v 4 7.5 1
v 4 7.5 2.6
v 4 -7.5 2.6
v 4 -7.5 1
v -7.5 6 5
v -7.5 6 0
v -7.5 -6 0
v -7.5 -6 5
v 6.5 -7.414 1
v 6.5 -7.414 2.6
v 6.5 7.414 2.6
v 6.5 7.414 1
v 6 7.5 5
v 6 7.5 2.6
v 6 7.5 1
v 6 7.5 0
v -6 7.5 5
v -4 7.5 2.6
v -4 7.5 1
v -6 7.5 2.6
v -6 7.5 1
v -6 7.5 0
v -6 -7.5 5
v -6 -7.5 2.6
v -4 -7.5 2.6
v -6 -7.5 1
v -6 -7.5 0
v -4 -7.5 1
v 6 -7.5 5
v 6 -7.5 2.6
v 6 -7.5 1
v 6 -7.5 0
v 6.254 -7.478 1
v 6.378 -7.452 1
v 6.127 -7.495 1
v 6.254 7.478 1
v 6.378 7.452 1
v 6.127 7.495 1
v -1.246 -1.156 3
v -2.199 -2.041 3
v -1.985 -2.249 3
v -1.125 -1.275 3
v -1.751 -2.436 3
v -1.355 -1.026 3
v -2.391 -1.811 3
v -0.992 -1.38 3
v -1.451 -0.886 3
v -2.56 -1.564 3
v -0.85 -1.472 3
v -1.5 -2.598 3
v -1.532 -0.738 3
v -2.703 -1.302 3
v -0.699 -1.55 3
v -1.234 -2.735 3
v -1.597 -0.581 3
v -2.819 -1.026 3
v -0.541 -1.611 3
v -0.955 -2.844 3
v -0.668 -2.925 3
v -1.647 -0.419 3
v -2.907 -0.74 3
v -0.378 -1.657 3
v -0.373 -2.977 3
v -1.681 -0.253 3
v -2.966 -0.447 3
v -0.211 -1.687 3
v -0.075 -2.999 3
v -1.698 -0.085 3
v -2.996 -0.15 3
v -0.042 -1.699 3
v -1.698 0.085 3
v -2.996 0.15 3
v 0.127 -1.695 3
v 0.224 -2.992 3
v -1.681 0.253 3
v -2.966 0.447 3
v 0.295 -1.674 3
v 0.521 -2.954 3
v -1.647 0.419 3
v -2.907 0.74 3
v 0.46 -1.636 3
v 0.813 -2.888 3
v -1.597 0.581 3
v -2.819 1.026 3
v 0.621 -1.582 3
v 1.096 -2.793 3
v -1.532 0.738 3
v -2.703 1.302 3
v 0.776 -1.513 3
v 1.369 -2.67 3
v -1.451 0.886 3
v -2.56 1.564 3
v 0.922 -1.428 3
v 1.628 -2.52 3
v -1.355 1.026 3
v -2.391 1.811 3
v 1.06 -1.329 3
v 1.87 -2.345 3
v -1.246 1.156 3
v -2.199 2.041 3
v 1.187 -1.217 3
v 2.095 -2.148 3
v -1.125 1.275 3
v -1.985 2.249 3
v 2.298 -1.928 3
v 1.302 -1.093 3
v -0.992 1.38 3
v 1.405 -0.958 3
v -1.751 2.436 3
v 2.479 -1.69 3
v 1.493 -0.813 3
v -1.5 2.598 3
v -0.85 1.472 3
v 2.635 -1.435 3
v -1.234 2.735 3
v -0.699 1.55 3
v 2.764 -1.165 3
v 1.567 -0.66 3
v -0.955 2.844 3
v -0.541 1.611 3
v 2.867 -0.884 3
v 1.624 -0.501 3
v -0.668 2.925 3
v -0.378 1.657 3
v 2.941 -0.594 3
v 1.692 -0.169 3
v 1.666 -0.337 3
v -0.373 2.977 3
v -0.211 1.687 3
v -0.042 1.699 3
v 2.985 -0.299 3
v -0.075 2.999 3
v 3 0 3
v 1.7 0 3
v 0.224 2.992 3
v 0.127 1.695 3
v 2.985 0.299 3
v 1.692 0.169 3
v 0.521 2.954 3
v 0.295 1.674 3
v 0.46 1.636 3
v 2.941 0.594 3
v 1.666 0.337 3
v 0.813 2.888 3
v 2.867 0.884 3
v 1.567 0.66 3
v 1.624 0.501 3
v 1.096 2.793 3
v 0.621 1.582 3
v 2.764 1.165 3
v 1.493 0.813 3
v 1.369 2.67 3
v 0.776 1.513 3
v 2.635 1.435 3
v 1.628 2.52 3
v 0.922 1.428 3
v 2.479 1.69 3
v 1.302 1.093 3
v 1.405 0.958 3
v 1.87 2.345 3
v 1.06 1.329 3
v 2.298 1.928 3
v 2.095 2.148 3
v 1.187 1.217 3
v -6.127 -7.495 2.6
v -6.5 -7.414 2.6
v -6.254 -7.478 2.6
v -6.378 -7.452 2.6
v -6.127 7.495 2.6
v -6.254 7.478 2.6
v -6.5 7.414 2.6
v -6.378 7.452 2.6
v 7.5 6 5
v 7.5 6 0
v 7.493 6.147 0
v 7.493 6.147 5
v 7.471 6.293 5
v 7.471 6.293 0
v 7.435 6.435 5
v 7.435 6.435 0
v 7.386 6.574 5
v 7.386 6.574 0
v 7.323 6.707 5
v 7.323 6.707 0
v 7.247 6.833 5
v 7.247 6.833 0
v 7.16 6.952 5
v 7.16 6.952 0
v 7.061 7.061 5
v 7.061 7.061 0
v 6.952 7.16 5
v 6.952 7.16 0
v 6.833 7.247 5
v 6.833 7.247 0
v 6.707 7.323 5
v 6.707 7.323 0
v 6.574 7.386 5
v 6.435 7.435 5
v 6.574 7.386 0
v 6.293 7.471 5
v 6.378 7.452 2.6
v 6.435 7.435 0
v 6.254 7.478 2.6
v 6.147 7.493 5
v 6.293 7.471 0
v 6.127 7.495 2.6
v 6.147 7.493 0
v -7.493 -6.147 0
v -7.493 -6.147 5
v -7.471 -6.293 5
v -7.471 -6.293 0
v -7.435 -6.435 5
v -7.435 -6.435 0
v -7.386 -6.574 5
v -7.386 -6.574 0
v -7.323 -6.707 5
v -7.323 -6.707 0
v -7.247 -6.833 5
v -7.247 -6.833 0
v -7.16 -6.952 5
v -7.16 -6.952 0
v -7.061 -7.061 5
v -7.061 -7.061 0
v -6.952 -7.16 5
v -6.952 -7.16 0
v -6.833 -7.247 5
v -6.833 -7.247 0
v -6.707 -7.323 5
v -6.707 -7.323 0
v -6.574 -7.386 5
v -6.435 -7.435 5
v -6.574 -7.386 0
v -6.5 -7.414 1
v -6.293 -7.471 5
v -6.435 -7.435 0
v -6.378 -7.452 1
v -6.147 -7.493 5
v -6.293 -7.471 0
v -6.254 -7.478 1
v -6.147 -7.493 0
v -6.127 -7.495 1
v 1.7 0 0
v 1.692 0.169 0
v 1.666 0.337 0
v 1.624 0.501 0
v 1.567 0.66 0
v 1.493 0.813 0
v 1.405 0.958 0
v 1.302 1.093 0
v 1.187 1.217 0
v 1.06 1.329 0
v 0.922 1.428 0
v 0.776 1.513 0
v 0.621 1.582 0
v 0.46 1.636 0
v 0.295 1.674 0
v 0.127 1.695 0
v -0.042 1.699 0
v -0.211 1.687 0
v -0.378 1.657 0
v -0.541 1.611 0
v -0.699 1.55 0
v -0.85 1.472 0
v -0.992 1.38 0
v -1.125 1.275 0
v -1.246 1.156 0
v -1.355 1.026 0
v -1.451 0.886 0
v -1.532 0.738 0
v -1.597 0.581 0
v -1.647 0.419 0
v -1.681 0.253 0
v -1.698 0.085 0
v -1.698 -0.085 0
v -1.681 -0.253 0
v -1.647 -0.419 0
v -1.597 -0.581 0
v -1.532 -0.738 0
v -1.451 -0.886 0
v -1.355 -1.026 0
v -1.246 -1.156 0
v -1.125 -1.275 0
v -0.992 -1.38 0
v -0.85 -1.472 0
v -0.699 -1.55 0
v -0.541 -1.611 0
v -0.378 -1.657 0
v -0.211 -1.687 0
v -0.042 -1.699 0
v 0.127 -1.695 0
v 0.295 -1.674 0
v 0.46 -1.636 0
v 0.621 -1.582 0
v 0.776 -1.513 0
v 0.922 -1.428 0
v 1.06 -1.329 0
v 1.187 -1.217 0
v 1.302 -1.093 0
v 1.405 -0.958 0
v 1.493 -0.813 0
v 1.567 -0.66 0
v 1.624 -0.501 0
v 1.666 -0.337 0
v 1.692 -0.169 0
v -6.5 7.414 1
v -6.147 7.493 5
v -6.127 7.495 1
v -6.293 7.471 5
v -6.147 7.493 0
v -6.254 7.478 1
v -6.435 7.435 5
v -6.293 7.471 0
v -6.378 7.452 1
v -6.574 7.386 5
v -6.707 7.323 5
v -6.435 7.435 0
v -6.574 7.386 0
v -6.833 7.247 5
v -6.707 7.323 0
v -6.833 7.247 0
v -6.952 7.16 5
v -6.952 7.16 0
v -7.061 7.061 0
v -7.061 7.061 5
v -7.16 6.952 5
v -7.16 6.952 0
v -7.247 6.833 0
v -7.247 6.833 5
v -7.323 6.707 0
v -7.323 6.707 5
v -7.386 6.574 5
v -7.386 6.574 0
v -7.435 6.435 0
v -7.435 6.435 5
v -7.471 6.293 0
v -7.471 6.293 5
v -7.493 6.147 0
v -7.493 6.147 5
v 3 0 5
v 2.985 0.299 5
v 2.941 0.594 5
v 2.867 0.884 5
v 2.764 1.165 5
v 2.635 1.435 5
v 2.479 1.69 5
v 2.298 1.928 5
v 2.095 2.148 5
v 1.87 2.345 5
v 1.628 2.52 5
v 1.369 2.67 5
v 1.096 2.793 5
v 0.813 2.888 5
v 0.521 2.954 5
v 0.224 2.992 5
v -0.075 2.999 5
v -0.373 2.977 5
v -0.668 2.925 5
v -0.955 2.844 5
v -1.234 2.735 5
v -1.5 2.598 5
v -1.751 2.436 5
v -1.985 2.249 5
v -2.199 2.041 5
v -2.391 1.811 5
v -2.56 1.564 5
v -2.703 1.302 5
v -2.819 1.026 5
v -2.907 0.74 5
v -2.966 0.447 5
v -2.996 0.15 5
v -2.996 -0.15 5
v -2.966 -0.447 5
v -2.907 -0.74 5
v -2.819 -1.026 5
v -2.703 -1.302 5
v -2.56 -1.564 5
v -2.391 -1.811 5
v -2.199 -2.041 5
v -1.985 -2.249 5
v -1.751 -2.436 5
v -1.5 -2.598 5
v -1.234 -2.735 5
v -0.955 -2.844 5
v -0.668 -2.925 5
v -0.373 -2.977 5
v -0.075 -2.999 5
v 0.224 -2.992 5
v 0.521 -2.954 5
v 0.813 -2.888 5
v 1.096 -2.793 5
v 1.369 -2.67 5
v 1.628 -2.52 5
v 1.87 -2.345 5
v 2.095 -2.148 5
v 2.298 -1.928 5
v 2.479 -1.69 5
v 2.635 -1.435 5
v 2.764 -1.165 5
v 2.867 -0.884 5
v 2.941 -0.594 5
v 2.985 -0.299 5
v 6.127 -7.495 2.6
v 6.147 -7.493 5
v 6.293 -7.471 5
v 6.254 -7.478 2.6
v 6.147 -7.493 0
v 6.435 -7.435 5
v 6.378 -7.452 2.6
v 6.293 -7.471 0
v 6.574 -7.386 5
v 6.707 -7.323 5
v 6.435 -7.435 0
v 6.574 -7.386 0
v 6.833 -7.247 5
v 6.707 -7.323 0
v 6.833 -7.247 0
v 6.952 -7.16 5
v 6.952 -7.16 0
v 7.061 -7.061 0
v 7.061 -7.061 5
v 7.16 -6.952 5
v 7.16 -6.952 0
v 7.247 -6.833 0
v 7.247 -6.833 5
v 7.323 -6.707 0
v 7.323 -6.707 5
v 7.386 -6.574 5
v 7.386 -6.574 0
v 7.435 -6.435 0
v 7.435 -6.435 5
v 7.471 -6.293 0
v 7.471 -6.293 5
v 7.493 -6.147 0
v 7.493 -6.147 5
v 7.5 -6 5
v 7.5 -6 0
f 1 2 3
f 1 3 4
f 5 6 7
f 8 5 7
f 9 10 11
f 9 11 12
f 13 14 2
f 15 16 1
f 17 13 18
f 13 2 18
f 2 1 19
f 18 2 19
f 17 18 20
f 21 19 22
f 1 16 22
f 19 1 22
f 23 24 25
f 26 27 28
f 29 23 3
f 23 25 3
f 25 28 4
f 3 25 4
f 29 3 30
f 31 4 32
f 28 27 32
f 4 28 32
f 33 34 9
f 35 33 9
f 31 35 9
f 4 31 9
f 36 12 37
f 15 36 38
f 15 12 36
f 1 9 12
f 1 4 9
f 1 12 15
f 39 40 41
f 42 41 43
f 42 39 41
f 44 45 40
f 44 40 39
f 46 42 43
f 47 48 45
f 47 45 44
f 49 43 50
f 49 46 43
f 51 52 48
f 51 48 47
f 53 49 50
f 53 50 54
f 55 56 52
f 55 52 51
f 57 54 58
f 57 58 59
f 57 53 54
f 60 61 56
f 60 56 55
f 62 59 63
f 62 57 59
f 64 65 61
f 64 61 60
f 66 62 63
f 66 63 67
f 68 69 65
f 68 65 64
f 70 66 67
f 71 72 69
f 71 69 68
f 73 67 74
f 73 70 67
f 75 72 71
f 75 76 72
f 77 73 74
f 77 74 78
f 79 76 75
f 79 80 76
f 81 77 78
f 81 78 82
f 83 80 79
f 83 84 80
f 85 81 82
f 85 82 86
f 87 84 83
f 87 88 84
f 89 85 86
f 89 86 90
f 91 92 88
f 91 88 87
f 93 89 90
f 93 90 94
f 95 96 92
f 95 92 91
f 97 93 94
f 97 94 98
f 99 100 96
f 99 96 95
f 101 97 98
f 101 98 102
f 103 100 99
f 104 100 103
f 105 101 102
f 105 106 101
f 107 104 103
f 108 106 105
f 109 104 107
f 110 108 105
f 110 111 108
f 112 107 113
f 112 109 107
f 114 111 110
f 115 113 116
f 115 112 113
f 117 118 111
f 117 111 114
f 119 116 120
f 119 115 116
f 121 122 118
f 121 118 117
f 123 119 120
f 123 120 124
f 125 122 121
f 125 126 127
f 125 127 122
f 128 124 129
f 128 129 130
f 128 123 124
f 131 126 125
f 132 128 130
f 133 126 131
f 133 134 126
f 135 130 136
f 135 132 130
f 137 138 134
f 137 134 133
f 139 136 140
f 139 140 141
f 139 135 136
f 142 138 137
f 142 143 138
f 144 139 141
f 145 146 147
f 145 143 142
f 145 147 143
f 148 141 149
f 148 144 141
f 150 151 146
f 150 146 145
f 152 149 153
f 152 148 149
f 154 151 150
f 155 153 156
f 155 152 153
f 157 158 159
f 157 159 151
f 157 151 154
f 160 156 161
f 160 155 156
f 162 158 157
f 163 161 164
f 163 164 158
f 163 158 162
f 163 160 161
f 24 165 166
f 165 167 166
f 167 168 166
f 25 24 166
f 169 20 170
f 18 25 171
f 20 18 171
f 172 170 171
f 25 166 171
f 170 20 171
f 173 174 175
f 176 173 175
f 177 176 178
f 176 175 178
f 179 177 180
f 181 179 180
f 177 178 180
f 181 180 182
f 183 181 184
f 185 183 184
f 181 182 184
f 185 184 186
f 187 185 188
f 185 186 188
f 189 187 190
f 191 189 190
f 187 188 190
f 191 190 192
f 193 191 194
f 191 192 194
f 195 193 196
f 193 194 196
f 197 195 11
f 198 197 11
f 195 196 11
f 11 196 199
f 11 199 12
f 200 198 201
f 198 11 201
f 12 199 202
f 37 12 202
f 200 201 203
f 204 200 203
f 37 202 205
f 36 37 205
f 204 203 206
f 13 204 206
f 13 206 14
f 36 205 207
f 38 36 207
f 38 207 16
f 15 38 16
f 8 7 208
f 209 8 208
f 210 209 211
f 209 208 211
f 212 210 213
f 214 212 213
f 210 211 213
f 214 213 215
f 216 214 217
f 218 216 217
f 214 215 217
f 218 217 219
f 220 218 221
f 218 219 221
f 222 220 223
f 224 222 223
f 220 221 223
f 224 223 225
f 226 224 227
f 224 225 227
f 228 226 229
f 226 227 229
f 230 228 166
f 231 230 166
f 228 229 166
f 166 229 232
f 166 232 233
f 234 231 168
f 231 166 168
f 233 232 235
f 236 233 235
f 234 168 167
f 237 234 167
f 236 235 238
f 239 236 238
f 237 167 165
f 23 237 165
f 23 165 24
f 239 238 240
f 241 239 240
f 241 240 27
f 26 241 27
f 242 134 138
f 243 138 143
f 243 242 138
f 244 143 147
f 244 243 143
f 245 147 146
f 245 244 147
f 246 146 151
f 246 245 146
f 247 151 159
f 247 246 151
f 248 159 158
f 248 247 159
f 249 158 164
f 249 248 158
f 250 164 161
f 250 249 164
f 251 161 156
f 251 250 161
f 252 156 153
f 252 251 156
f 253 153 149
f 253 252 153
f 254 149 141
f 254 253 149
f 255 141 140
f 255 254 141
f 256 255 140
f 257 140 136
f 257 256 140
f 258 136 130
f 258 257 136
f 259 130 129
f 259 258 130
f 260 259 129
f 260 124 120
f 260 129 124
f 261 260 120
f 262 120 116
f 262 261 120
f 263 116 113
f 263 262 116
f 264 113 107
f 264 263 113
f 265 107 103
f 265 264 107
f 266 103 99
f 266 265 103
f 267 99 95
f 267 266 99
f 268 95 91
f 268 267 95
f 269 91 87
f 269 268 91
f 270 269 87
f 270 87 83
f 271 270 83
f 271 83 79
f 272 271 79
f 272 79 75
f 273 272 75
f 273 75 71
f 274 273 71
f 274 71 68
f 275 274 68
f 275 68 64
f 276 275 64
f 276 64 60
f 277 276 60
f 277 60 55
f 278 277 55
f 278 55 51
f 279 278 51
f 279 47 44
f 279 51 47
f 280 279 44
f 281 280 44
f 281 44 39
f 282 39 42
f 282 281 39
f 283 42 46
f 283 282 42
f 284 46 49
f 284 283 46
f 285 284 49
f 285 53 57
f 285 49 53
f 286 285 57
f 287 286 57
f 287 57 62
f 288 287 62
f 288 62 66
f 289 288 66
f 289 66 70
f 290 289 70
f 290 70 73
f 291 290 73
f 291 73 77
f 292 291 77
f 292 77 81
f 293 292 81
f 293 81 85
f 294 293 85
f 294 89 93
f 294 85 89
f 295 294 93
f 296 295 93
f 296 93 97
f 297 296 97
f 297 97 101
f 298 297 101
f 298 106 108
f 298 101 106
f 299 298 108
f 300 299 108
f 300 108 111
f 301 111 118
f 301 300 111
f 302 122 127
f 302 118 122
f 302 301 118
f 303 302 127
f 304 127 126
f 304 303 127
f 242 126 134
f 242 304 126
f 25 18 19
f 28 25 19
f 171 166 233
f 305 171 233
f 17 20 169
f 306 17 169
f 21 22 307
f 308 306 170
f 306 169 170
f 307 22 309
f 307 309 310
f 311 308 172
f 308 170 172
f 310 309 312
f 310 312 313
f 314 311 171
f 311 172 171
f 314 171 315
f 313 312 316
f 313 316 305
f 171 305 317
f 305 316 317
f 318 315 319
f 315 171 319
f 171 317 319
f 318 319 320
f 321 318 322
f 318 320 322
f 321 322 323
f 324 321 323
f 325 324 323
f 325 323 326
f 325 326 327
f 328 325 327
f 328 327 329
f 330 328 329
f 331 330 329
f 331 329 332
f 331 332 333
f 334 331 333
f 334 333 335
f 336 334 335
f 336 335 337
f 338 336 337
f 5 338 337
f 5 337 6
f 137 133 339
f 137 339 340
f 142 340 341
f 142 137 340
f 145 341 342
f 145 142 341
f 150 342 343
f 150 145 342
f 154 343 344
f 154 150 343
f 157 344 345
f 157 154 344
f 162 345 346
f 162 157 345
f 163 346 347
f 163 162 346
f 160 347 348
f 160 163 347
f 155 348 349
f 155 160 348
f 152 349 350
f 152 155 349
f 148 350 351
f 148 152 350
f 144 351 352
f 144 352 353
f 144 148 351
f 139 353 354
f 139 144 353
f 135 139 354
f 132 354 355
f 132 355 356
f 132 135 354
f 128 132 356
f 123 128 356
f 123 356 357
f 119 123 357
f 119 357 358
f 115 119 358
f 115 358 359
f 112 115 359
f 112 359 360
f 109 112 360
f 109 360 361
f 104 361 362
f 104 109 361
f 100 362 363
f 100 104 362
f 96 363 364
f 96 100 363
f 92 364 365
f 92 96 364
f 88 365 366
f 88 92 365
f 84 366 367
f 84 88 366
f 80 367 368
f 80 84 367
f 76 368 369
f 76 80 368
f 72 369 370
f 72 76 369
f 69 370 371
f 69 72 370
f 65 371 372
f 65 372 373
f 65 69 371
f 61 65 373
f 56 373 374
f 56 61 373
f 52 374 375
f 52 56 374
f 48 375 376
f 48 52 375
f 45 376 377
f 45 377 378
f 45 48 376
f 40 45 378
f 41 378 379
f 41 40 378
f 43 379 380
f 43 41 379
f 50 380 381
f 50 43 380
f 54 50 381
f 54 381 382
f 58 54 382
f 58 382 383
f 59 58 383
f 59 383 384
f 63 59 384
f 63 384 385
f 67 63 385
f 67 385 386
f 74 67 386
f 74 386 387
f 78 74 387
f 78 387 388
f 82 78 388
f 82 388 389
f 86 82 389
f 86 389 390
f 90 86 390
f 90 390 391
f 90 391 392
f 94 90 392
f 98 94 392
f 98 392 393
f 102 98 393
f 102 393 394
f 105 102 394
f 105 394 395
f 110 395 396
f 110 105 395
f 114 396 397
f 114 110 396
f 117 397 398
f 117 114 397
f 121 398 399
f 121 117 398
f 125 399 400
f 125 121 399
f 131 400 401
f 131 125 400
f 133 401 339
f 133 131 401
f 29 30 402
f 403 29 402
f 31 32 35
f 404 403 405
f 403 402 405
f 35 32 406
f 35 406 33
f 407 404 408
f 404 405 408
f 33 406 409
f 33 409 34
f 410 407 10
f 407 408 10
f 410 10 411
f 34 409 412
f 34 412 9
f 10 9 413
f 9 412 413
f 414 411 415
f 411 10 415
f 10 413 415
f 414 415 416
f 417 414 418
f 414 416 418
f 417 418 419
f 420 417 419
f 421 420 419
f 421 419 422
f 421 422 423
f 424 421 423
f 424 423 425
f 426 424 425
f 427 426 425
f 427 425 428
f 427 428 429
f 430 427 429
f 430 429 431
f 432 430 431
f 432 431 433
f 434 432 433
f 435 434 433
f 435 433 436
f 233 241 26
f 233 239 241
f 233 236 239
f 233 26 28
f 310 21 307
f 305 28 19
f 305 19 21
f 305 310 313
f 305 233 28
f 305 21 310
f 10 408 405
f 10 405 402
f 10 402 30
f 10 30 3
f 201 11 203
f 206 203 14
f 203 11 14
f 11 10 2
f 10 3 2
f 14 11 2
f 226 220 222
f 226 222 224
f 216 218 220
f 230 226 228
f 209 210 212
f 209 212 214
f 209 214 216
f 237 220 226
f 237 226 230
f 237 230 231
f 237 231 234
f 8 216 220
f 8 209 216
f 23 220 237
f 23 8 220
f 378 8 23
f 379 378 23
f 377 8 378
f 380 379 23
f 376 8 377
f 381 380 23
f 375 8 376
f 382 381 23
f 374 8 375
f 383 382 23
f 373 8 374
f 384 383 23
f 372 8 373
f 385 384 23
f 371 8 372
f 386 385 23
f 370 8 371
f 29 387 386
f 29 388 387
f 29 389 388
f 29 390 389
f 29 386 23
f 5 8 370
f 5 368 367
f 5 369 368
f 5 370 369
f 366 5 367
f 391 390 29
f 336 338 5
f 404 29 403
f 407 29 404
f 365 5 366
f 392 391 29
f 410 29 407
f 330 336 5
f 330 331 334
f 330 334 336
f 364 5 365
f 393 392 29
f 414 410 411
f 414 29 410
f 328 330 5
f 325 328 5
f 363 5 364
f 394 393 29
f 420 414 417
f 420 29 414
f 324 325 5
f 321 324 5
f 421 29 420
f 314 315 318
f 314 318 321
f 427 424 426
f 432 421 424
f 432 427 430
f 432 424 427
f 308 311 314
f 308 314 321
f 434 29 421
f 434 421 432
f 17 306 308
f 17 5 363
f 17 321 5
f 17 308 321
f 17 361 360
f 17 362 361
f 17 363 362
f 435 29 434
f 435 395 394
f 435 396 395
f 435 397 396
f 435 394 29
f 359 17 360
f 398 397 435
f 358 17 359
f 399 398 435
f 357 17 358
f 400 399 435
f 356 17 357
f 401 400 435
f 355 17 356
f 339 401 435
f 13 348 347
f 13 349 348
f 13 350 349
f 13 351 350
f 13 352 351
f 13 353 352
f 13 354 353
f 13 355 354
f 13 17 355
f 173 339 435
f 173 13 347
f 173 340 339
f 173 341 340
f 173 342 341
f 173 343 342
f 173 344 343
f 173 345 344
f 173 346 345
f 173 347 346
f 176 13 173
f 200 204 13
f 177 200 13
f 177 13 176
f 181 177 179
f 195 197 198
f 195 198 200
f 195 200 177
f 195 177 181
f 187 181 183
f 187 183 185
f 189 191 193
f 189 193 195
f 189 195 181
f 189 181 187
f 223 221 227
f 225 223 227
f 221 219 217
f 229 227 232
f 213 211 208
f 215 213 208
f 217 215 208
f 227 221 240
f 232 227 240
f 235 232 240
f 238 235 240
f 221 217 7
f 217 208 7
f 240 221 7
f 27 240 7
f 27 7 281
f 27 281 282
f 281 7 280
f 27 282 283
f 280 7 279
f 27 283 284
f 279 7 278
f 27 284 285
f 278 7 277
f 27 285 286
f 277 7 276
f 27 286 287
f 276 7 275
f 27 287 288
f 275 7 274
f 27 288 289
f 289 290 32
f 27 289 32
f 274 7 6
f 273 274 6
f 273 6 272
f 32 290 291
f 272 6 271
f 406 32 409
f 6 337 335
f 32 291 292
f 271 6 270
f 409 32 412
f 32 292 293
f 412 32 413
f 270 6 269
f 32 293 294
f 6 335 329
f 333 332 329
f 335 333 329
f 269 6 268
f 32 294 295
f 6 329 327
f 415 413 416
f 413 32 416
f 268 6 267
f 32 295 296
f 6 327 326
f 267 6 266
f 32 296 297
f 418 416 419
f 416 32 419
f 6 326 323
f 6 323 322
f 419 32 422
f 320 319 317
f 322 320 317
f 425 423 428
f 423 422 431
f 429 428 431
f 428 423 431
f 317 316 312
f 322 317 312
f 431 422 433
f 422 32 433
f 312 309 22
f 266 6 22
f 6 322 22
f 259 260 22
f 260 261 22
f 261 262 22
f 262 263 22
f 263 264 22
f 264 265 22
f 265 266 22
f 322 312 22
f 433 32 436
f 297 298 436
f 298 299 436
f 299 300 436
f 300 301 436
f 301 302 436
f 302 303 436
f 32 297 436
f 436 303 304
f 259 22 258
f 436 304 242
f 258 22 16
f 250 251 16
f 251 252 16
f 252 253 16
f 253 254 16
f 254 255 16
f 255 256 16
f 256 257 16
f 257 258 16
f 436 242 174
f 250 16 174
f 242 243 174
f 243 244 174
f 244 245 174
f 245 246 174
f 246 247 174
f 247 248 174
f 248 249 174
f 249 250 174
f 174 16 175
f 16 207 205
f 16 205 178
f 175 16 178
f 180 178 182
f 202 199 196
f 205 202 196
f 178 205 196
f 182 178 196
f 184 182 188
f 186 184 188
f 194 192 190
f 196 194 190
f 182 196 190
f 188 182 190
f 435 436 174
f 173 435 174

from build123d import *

# Parameters (mm, degrees)
BASE_15X15_DEPTH     = 5
CROQUIS2_R           = 1.7
PASO_M3_DEPTH        = 5
CAJA_CABEZA_START    = 3
CROQUIS3_R           = 3
CAJA_CABEZA_DEPTH    = 2
TUNEL_CINCHO_A_START = 4
CROQUIS4_W           = 1.6
CROQUIS4_H           = 16
TUNEL_CINCHO_A_DEPTH = 2.5
TUNEL_CINCHO_B_START = -6.5
CROQUIS5_W           = 1.6
CROQUIS5_H           = 16
TUNEL_CINCHO_B_DEPTH = 2.5


with BuildPart() as part:
    # Croquis1 → Base_15x15 (new body)
    with BuildSketch(Plane.XY):
        with BuildLine():
            Line((-6, -7.5), (6, -7.5))
            ThreePointArc((6, -7.5), (7.060660172, -7.060660172), (7.5, -6))
            Line((7.5, -6), (7.5, 6))
            ThreePointArc((7.5, 6), (7.060660172, 7.060660172), (6, 7.5))
            Line((6, 7.5), (-6, 7.5))
            ThreePointArc((-6, 7.5), (-7.060660172, 7.060660172), (-7.5, 6))
            Line((-7.5, 6), (-7.5, -6))
            ThreePointArc((-7.5, -6), (-7.060660172, -7.060660172), (-6, -7.5))
        make_face()
    extrude(amount=BASE_15X15_DEPTH)

    # Croquis2 → Paso_M3 (cut)
    with BuildSketch(Plane.XY):
        Circle(CROQUIS2_R)
    extrude(amount=PASO_M3_DEPTH, mode=Mode.SUBTRACT)

    # Croquis3 → Caja_cabeza (cut)
    with BuildSketch(Plane.XY.offset(CAJA_CABEZA_START)):
        Circle(CROQUIS3_R)
    extrude(amount=CAJA_CABEZA_DEPTH, mode=Mode.SUBTRACT)

    # Croquis4 → Tunel_cincho_A (cut)
    with BuildSketch(Plane(origin=(0, 0, 0), x_dir=(0, 0, -1), z_dir=(1, 0, 0)).offset(TUNEL_CINCHO_A_START)):
        with Locations((-1.8, 0)):
            Rectangle(CROQUIS4_W, CROQUIS4_H)
    extrude(amount=TUNEL_CINCHO_A_DEPTH, mode=Mode.SUBTRACT)

    # Croquis5 → Tunel_cincho_B (cut)
    with BuildSketch(Plane(origin=(0, 0, 0), x_dir=(0, 0, -1), z_dir=(1, 0, 0)).offset(TUNEL_CINCHO_B_START)):
        with Locations((-1.8, 0)):
            Rectangle(CROQUIS5_W, CROQUIS5_H)
    extrude(amount=TUNEL_CINCHO_B_DEPTH, mode=Mode.SUBTRACT)


solid = part.part
